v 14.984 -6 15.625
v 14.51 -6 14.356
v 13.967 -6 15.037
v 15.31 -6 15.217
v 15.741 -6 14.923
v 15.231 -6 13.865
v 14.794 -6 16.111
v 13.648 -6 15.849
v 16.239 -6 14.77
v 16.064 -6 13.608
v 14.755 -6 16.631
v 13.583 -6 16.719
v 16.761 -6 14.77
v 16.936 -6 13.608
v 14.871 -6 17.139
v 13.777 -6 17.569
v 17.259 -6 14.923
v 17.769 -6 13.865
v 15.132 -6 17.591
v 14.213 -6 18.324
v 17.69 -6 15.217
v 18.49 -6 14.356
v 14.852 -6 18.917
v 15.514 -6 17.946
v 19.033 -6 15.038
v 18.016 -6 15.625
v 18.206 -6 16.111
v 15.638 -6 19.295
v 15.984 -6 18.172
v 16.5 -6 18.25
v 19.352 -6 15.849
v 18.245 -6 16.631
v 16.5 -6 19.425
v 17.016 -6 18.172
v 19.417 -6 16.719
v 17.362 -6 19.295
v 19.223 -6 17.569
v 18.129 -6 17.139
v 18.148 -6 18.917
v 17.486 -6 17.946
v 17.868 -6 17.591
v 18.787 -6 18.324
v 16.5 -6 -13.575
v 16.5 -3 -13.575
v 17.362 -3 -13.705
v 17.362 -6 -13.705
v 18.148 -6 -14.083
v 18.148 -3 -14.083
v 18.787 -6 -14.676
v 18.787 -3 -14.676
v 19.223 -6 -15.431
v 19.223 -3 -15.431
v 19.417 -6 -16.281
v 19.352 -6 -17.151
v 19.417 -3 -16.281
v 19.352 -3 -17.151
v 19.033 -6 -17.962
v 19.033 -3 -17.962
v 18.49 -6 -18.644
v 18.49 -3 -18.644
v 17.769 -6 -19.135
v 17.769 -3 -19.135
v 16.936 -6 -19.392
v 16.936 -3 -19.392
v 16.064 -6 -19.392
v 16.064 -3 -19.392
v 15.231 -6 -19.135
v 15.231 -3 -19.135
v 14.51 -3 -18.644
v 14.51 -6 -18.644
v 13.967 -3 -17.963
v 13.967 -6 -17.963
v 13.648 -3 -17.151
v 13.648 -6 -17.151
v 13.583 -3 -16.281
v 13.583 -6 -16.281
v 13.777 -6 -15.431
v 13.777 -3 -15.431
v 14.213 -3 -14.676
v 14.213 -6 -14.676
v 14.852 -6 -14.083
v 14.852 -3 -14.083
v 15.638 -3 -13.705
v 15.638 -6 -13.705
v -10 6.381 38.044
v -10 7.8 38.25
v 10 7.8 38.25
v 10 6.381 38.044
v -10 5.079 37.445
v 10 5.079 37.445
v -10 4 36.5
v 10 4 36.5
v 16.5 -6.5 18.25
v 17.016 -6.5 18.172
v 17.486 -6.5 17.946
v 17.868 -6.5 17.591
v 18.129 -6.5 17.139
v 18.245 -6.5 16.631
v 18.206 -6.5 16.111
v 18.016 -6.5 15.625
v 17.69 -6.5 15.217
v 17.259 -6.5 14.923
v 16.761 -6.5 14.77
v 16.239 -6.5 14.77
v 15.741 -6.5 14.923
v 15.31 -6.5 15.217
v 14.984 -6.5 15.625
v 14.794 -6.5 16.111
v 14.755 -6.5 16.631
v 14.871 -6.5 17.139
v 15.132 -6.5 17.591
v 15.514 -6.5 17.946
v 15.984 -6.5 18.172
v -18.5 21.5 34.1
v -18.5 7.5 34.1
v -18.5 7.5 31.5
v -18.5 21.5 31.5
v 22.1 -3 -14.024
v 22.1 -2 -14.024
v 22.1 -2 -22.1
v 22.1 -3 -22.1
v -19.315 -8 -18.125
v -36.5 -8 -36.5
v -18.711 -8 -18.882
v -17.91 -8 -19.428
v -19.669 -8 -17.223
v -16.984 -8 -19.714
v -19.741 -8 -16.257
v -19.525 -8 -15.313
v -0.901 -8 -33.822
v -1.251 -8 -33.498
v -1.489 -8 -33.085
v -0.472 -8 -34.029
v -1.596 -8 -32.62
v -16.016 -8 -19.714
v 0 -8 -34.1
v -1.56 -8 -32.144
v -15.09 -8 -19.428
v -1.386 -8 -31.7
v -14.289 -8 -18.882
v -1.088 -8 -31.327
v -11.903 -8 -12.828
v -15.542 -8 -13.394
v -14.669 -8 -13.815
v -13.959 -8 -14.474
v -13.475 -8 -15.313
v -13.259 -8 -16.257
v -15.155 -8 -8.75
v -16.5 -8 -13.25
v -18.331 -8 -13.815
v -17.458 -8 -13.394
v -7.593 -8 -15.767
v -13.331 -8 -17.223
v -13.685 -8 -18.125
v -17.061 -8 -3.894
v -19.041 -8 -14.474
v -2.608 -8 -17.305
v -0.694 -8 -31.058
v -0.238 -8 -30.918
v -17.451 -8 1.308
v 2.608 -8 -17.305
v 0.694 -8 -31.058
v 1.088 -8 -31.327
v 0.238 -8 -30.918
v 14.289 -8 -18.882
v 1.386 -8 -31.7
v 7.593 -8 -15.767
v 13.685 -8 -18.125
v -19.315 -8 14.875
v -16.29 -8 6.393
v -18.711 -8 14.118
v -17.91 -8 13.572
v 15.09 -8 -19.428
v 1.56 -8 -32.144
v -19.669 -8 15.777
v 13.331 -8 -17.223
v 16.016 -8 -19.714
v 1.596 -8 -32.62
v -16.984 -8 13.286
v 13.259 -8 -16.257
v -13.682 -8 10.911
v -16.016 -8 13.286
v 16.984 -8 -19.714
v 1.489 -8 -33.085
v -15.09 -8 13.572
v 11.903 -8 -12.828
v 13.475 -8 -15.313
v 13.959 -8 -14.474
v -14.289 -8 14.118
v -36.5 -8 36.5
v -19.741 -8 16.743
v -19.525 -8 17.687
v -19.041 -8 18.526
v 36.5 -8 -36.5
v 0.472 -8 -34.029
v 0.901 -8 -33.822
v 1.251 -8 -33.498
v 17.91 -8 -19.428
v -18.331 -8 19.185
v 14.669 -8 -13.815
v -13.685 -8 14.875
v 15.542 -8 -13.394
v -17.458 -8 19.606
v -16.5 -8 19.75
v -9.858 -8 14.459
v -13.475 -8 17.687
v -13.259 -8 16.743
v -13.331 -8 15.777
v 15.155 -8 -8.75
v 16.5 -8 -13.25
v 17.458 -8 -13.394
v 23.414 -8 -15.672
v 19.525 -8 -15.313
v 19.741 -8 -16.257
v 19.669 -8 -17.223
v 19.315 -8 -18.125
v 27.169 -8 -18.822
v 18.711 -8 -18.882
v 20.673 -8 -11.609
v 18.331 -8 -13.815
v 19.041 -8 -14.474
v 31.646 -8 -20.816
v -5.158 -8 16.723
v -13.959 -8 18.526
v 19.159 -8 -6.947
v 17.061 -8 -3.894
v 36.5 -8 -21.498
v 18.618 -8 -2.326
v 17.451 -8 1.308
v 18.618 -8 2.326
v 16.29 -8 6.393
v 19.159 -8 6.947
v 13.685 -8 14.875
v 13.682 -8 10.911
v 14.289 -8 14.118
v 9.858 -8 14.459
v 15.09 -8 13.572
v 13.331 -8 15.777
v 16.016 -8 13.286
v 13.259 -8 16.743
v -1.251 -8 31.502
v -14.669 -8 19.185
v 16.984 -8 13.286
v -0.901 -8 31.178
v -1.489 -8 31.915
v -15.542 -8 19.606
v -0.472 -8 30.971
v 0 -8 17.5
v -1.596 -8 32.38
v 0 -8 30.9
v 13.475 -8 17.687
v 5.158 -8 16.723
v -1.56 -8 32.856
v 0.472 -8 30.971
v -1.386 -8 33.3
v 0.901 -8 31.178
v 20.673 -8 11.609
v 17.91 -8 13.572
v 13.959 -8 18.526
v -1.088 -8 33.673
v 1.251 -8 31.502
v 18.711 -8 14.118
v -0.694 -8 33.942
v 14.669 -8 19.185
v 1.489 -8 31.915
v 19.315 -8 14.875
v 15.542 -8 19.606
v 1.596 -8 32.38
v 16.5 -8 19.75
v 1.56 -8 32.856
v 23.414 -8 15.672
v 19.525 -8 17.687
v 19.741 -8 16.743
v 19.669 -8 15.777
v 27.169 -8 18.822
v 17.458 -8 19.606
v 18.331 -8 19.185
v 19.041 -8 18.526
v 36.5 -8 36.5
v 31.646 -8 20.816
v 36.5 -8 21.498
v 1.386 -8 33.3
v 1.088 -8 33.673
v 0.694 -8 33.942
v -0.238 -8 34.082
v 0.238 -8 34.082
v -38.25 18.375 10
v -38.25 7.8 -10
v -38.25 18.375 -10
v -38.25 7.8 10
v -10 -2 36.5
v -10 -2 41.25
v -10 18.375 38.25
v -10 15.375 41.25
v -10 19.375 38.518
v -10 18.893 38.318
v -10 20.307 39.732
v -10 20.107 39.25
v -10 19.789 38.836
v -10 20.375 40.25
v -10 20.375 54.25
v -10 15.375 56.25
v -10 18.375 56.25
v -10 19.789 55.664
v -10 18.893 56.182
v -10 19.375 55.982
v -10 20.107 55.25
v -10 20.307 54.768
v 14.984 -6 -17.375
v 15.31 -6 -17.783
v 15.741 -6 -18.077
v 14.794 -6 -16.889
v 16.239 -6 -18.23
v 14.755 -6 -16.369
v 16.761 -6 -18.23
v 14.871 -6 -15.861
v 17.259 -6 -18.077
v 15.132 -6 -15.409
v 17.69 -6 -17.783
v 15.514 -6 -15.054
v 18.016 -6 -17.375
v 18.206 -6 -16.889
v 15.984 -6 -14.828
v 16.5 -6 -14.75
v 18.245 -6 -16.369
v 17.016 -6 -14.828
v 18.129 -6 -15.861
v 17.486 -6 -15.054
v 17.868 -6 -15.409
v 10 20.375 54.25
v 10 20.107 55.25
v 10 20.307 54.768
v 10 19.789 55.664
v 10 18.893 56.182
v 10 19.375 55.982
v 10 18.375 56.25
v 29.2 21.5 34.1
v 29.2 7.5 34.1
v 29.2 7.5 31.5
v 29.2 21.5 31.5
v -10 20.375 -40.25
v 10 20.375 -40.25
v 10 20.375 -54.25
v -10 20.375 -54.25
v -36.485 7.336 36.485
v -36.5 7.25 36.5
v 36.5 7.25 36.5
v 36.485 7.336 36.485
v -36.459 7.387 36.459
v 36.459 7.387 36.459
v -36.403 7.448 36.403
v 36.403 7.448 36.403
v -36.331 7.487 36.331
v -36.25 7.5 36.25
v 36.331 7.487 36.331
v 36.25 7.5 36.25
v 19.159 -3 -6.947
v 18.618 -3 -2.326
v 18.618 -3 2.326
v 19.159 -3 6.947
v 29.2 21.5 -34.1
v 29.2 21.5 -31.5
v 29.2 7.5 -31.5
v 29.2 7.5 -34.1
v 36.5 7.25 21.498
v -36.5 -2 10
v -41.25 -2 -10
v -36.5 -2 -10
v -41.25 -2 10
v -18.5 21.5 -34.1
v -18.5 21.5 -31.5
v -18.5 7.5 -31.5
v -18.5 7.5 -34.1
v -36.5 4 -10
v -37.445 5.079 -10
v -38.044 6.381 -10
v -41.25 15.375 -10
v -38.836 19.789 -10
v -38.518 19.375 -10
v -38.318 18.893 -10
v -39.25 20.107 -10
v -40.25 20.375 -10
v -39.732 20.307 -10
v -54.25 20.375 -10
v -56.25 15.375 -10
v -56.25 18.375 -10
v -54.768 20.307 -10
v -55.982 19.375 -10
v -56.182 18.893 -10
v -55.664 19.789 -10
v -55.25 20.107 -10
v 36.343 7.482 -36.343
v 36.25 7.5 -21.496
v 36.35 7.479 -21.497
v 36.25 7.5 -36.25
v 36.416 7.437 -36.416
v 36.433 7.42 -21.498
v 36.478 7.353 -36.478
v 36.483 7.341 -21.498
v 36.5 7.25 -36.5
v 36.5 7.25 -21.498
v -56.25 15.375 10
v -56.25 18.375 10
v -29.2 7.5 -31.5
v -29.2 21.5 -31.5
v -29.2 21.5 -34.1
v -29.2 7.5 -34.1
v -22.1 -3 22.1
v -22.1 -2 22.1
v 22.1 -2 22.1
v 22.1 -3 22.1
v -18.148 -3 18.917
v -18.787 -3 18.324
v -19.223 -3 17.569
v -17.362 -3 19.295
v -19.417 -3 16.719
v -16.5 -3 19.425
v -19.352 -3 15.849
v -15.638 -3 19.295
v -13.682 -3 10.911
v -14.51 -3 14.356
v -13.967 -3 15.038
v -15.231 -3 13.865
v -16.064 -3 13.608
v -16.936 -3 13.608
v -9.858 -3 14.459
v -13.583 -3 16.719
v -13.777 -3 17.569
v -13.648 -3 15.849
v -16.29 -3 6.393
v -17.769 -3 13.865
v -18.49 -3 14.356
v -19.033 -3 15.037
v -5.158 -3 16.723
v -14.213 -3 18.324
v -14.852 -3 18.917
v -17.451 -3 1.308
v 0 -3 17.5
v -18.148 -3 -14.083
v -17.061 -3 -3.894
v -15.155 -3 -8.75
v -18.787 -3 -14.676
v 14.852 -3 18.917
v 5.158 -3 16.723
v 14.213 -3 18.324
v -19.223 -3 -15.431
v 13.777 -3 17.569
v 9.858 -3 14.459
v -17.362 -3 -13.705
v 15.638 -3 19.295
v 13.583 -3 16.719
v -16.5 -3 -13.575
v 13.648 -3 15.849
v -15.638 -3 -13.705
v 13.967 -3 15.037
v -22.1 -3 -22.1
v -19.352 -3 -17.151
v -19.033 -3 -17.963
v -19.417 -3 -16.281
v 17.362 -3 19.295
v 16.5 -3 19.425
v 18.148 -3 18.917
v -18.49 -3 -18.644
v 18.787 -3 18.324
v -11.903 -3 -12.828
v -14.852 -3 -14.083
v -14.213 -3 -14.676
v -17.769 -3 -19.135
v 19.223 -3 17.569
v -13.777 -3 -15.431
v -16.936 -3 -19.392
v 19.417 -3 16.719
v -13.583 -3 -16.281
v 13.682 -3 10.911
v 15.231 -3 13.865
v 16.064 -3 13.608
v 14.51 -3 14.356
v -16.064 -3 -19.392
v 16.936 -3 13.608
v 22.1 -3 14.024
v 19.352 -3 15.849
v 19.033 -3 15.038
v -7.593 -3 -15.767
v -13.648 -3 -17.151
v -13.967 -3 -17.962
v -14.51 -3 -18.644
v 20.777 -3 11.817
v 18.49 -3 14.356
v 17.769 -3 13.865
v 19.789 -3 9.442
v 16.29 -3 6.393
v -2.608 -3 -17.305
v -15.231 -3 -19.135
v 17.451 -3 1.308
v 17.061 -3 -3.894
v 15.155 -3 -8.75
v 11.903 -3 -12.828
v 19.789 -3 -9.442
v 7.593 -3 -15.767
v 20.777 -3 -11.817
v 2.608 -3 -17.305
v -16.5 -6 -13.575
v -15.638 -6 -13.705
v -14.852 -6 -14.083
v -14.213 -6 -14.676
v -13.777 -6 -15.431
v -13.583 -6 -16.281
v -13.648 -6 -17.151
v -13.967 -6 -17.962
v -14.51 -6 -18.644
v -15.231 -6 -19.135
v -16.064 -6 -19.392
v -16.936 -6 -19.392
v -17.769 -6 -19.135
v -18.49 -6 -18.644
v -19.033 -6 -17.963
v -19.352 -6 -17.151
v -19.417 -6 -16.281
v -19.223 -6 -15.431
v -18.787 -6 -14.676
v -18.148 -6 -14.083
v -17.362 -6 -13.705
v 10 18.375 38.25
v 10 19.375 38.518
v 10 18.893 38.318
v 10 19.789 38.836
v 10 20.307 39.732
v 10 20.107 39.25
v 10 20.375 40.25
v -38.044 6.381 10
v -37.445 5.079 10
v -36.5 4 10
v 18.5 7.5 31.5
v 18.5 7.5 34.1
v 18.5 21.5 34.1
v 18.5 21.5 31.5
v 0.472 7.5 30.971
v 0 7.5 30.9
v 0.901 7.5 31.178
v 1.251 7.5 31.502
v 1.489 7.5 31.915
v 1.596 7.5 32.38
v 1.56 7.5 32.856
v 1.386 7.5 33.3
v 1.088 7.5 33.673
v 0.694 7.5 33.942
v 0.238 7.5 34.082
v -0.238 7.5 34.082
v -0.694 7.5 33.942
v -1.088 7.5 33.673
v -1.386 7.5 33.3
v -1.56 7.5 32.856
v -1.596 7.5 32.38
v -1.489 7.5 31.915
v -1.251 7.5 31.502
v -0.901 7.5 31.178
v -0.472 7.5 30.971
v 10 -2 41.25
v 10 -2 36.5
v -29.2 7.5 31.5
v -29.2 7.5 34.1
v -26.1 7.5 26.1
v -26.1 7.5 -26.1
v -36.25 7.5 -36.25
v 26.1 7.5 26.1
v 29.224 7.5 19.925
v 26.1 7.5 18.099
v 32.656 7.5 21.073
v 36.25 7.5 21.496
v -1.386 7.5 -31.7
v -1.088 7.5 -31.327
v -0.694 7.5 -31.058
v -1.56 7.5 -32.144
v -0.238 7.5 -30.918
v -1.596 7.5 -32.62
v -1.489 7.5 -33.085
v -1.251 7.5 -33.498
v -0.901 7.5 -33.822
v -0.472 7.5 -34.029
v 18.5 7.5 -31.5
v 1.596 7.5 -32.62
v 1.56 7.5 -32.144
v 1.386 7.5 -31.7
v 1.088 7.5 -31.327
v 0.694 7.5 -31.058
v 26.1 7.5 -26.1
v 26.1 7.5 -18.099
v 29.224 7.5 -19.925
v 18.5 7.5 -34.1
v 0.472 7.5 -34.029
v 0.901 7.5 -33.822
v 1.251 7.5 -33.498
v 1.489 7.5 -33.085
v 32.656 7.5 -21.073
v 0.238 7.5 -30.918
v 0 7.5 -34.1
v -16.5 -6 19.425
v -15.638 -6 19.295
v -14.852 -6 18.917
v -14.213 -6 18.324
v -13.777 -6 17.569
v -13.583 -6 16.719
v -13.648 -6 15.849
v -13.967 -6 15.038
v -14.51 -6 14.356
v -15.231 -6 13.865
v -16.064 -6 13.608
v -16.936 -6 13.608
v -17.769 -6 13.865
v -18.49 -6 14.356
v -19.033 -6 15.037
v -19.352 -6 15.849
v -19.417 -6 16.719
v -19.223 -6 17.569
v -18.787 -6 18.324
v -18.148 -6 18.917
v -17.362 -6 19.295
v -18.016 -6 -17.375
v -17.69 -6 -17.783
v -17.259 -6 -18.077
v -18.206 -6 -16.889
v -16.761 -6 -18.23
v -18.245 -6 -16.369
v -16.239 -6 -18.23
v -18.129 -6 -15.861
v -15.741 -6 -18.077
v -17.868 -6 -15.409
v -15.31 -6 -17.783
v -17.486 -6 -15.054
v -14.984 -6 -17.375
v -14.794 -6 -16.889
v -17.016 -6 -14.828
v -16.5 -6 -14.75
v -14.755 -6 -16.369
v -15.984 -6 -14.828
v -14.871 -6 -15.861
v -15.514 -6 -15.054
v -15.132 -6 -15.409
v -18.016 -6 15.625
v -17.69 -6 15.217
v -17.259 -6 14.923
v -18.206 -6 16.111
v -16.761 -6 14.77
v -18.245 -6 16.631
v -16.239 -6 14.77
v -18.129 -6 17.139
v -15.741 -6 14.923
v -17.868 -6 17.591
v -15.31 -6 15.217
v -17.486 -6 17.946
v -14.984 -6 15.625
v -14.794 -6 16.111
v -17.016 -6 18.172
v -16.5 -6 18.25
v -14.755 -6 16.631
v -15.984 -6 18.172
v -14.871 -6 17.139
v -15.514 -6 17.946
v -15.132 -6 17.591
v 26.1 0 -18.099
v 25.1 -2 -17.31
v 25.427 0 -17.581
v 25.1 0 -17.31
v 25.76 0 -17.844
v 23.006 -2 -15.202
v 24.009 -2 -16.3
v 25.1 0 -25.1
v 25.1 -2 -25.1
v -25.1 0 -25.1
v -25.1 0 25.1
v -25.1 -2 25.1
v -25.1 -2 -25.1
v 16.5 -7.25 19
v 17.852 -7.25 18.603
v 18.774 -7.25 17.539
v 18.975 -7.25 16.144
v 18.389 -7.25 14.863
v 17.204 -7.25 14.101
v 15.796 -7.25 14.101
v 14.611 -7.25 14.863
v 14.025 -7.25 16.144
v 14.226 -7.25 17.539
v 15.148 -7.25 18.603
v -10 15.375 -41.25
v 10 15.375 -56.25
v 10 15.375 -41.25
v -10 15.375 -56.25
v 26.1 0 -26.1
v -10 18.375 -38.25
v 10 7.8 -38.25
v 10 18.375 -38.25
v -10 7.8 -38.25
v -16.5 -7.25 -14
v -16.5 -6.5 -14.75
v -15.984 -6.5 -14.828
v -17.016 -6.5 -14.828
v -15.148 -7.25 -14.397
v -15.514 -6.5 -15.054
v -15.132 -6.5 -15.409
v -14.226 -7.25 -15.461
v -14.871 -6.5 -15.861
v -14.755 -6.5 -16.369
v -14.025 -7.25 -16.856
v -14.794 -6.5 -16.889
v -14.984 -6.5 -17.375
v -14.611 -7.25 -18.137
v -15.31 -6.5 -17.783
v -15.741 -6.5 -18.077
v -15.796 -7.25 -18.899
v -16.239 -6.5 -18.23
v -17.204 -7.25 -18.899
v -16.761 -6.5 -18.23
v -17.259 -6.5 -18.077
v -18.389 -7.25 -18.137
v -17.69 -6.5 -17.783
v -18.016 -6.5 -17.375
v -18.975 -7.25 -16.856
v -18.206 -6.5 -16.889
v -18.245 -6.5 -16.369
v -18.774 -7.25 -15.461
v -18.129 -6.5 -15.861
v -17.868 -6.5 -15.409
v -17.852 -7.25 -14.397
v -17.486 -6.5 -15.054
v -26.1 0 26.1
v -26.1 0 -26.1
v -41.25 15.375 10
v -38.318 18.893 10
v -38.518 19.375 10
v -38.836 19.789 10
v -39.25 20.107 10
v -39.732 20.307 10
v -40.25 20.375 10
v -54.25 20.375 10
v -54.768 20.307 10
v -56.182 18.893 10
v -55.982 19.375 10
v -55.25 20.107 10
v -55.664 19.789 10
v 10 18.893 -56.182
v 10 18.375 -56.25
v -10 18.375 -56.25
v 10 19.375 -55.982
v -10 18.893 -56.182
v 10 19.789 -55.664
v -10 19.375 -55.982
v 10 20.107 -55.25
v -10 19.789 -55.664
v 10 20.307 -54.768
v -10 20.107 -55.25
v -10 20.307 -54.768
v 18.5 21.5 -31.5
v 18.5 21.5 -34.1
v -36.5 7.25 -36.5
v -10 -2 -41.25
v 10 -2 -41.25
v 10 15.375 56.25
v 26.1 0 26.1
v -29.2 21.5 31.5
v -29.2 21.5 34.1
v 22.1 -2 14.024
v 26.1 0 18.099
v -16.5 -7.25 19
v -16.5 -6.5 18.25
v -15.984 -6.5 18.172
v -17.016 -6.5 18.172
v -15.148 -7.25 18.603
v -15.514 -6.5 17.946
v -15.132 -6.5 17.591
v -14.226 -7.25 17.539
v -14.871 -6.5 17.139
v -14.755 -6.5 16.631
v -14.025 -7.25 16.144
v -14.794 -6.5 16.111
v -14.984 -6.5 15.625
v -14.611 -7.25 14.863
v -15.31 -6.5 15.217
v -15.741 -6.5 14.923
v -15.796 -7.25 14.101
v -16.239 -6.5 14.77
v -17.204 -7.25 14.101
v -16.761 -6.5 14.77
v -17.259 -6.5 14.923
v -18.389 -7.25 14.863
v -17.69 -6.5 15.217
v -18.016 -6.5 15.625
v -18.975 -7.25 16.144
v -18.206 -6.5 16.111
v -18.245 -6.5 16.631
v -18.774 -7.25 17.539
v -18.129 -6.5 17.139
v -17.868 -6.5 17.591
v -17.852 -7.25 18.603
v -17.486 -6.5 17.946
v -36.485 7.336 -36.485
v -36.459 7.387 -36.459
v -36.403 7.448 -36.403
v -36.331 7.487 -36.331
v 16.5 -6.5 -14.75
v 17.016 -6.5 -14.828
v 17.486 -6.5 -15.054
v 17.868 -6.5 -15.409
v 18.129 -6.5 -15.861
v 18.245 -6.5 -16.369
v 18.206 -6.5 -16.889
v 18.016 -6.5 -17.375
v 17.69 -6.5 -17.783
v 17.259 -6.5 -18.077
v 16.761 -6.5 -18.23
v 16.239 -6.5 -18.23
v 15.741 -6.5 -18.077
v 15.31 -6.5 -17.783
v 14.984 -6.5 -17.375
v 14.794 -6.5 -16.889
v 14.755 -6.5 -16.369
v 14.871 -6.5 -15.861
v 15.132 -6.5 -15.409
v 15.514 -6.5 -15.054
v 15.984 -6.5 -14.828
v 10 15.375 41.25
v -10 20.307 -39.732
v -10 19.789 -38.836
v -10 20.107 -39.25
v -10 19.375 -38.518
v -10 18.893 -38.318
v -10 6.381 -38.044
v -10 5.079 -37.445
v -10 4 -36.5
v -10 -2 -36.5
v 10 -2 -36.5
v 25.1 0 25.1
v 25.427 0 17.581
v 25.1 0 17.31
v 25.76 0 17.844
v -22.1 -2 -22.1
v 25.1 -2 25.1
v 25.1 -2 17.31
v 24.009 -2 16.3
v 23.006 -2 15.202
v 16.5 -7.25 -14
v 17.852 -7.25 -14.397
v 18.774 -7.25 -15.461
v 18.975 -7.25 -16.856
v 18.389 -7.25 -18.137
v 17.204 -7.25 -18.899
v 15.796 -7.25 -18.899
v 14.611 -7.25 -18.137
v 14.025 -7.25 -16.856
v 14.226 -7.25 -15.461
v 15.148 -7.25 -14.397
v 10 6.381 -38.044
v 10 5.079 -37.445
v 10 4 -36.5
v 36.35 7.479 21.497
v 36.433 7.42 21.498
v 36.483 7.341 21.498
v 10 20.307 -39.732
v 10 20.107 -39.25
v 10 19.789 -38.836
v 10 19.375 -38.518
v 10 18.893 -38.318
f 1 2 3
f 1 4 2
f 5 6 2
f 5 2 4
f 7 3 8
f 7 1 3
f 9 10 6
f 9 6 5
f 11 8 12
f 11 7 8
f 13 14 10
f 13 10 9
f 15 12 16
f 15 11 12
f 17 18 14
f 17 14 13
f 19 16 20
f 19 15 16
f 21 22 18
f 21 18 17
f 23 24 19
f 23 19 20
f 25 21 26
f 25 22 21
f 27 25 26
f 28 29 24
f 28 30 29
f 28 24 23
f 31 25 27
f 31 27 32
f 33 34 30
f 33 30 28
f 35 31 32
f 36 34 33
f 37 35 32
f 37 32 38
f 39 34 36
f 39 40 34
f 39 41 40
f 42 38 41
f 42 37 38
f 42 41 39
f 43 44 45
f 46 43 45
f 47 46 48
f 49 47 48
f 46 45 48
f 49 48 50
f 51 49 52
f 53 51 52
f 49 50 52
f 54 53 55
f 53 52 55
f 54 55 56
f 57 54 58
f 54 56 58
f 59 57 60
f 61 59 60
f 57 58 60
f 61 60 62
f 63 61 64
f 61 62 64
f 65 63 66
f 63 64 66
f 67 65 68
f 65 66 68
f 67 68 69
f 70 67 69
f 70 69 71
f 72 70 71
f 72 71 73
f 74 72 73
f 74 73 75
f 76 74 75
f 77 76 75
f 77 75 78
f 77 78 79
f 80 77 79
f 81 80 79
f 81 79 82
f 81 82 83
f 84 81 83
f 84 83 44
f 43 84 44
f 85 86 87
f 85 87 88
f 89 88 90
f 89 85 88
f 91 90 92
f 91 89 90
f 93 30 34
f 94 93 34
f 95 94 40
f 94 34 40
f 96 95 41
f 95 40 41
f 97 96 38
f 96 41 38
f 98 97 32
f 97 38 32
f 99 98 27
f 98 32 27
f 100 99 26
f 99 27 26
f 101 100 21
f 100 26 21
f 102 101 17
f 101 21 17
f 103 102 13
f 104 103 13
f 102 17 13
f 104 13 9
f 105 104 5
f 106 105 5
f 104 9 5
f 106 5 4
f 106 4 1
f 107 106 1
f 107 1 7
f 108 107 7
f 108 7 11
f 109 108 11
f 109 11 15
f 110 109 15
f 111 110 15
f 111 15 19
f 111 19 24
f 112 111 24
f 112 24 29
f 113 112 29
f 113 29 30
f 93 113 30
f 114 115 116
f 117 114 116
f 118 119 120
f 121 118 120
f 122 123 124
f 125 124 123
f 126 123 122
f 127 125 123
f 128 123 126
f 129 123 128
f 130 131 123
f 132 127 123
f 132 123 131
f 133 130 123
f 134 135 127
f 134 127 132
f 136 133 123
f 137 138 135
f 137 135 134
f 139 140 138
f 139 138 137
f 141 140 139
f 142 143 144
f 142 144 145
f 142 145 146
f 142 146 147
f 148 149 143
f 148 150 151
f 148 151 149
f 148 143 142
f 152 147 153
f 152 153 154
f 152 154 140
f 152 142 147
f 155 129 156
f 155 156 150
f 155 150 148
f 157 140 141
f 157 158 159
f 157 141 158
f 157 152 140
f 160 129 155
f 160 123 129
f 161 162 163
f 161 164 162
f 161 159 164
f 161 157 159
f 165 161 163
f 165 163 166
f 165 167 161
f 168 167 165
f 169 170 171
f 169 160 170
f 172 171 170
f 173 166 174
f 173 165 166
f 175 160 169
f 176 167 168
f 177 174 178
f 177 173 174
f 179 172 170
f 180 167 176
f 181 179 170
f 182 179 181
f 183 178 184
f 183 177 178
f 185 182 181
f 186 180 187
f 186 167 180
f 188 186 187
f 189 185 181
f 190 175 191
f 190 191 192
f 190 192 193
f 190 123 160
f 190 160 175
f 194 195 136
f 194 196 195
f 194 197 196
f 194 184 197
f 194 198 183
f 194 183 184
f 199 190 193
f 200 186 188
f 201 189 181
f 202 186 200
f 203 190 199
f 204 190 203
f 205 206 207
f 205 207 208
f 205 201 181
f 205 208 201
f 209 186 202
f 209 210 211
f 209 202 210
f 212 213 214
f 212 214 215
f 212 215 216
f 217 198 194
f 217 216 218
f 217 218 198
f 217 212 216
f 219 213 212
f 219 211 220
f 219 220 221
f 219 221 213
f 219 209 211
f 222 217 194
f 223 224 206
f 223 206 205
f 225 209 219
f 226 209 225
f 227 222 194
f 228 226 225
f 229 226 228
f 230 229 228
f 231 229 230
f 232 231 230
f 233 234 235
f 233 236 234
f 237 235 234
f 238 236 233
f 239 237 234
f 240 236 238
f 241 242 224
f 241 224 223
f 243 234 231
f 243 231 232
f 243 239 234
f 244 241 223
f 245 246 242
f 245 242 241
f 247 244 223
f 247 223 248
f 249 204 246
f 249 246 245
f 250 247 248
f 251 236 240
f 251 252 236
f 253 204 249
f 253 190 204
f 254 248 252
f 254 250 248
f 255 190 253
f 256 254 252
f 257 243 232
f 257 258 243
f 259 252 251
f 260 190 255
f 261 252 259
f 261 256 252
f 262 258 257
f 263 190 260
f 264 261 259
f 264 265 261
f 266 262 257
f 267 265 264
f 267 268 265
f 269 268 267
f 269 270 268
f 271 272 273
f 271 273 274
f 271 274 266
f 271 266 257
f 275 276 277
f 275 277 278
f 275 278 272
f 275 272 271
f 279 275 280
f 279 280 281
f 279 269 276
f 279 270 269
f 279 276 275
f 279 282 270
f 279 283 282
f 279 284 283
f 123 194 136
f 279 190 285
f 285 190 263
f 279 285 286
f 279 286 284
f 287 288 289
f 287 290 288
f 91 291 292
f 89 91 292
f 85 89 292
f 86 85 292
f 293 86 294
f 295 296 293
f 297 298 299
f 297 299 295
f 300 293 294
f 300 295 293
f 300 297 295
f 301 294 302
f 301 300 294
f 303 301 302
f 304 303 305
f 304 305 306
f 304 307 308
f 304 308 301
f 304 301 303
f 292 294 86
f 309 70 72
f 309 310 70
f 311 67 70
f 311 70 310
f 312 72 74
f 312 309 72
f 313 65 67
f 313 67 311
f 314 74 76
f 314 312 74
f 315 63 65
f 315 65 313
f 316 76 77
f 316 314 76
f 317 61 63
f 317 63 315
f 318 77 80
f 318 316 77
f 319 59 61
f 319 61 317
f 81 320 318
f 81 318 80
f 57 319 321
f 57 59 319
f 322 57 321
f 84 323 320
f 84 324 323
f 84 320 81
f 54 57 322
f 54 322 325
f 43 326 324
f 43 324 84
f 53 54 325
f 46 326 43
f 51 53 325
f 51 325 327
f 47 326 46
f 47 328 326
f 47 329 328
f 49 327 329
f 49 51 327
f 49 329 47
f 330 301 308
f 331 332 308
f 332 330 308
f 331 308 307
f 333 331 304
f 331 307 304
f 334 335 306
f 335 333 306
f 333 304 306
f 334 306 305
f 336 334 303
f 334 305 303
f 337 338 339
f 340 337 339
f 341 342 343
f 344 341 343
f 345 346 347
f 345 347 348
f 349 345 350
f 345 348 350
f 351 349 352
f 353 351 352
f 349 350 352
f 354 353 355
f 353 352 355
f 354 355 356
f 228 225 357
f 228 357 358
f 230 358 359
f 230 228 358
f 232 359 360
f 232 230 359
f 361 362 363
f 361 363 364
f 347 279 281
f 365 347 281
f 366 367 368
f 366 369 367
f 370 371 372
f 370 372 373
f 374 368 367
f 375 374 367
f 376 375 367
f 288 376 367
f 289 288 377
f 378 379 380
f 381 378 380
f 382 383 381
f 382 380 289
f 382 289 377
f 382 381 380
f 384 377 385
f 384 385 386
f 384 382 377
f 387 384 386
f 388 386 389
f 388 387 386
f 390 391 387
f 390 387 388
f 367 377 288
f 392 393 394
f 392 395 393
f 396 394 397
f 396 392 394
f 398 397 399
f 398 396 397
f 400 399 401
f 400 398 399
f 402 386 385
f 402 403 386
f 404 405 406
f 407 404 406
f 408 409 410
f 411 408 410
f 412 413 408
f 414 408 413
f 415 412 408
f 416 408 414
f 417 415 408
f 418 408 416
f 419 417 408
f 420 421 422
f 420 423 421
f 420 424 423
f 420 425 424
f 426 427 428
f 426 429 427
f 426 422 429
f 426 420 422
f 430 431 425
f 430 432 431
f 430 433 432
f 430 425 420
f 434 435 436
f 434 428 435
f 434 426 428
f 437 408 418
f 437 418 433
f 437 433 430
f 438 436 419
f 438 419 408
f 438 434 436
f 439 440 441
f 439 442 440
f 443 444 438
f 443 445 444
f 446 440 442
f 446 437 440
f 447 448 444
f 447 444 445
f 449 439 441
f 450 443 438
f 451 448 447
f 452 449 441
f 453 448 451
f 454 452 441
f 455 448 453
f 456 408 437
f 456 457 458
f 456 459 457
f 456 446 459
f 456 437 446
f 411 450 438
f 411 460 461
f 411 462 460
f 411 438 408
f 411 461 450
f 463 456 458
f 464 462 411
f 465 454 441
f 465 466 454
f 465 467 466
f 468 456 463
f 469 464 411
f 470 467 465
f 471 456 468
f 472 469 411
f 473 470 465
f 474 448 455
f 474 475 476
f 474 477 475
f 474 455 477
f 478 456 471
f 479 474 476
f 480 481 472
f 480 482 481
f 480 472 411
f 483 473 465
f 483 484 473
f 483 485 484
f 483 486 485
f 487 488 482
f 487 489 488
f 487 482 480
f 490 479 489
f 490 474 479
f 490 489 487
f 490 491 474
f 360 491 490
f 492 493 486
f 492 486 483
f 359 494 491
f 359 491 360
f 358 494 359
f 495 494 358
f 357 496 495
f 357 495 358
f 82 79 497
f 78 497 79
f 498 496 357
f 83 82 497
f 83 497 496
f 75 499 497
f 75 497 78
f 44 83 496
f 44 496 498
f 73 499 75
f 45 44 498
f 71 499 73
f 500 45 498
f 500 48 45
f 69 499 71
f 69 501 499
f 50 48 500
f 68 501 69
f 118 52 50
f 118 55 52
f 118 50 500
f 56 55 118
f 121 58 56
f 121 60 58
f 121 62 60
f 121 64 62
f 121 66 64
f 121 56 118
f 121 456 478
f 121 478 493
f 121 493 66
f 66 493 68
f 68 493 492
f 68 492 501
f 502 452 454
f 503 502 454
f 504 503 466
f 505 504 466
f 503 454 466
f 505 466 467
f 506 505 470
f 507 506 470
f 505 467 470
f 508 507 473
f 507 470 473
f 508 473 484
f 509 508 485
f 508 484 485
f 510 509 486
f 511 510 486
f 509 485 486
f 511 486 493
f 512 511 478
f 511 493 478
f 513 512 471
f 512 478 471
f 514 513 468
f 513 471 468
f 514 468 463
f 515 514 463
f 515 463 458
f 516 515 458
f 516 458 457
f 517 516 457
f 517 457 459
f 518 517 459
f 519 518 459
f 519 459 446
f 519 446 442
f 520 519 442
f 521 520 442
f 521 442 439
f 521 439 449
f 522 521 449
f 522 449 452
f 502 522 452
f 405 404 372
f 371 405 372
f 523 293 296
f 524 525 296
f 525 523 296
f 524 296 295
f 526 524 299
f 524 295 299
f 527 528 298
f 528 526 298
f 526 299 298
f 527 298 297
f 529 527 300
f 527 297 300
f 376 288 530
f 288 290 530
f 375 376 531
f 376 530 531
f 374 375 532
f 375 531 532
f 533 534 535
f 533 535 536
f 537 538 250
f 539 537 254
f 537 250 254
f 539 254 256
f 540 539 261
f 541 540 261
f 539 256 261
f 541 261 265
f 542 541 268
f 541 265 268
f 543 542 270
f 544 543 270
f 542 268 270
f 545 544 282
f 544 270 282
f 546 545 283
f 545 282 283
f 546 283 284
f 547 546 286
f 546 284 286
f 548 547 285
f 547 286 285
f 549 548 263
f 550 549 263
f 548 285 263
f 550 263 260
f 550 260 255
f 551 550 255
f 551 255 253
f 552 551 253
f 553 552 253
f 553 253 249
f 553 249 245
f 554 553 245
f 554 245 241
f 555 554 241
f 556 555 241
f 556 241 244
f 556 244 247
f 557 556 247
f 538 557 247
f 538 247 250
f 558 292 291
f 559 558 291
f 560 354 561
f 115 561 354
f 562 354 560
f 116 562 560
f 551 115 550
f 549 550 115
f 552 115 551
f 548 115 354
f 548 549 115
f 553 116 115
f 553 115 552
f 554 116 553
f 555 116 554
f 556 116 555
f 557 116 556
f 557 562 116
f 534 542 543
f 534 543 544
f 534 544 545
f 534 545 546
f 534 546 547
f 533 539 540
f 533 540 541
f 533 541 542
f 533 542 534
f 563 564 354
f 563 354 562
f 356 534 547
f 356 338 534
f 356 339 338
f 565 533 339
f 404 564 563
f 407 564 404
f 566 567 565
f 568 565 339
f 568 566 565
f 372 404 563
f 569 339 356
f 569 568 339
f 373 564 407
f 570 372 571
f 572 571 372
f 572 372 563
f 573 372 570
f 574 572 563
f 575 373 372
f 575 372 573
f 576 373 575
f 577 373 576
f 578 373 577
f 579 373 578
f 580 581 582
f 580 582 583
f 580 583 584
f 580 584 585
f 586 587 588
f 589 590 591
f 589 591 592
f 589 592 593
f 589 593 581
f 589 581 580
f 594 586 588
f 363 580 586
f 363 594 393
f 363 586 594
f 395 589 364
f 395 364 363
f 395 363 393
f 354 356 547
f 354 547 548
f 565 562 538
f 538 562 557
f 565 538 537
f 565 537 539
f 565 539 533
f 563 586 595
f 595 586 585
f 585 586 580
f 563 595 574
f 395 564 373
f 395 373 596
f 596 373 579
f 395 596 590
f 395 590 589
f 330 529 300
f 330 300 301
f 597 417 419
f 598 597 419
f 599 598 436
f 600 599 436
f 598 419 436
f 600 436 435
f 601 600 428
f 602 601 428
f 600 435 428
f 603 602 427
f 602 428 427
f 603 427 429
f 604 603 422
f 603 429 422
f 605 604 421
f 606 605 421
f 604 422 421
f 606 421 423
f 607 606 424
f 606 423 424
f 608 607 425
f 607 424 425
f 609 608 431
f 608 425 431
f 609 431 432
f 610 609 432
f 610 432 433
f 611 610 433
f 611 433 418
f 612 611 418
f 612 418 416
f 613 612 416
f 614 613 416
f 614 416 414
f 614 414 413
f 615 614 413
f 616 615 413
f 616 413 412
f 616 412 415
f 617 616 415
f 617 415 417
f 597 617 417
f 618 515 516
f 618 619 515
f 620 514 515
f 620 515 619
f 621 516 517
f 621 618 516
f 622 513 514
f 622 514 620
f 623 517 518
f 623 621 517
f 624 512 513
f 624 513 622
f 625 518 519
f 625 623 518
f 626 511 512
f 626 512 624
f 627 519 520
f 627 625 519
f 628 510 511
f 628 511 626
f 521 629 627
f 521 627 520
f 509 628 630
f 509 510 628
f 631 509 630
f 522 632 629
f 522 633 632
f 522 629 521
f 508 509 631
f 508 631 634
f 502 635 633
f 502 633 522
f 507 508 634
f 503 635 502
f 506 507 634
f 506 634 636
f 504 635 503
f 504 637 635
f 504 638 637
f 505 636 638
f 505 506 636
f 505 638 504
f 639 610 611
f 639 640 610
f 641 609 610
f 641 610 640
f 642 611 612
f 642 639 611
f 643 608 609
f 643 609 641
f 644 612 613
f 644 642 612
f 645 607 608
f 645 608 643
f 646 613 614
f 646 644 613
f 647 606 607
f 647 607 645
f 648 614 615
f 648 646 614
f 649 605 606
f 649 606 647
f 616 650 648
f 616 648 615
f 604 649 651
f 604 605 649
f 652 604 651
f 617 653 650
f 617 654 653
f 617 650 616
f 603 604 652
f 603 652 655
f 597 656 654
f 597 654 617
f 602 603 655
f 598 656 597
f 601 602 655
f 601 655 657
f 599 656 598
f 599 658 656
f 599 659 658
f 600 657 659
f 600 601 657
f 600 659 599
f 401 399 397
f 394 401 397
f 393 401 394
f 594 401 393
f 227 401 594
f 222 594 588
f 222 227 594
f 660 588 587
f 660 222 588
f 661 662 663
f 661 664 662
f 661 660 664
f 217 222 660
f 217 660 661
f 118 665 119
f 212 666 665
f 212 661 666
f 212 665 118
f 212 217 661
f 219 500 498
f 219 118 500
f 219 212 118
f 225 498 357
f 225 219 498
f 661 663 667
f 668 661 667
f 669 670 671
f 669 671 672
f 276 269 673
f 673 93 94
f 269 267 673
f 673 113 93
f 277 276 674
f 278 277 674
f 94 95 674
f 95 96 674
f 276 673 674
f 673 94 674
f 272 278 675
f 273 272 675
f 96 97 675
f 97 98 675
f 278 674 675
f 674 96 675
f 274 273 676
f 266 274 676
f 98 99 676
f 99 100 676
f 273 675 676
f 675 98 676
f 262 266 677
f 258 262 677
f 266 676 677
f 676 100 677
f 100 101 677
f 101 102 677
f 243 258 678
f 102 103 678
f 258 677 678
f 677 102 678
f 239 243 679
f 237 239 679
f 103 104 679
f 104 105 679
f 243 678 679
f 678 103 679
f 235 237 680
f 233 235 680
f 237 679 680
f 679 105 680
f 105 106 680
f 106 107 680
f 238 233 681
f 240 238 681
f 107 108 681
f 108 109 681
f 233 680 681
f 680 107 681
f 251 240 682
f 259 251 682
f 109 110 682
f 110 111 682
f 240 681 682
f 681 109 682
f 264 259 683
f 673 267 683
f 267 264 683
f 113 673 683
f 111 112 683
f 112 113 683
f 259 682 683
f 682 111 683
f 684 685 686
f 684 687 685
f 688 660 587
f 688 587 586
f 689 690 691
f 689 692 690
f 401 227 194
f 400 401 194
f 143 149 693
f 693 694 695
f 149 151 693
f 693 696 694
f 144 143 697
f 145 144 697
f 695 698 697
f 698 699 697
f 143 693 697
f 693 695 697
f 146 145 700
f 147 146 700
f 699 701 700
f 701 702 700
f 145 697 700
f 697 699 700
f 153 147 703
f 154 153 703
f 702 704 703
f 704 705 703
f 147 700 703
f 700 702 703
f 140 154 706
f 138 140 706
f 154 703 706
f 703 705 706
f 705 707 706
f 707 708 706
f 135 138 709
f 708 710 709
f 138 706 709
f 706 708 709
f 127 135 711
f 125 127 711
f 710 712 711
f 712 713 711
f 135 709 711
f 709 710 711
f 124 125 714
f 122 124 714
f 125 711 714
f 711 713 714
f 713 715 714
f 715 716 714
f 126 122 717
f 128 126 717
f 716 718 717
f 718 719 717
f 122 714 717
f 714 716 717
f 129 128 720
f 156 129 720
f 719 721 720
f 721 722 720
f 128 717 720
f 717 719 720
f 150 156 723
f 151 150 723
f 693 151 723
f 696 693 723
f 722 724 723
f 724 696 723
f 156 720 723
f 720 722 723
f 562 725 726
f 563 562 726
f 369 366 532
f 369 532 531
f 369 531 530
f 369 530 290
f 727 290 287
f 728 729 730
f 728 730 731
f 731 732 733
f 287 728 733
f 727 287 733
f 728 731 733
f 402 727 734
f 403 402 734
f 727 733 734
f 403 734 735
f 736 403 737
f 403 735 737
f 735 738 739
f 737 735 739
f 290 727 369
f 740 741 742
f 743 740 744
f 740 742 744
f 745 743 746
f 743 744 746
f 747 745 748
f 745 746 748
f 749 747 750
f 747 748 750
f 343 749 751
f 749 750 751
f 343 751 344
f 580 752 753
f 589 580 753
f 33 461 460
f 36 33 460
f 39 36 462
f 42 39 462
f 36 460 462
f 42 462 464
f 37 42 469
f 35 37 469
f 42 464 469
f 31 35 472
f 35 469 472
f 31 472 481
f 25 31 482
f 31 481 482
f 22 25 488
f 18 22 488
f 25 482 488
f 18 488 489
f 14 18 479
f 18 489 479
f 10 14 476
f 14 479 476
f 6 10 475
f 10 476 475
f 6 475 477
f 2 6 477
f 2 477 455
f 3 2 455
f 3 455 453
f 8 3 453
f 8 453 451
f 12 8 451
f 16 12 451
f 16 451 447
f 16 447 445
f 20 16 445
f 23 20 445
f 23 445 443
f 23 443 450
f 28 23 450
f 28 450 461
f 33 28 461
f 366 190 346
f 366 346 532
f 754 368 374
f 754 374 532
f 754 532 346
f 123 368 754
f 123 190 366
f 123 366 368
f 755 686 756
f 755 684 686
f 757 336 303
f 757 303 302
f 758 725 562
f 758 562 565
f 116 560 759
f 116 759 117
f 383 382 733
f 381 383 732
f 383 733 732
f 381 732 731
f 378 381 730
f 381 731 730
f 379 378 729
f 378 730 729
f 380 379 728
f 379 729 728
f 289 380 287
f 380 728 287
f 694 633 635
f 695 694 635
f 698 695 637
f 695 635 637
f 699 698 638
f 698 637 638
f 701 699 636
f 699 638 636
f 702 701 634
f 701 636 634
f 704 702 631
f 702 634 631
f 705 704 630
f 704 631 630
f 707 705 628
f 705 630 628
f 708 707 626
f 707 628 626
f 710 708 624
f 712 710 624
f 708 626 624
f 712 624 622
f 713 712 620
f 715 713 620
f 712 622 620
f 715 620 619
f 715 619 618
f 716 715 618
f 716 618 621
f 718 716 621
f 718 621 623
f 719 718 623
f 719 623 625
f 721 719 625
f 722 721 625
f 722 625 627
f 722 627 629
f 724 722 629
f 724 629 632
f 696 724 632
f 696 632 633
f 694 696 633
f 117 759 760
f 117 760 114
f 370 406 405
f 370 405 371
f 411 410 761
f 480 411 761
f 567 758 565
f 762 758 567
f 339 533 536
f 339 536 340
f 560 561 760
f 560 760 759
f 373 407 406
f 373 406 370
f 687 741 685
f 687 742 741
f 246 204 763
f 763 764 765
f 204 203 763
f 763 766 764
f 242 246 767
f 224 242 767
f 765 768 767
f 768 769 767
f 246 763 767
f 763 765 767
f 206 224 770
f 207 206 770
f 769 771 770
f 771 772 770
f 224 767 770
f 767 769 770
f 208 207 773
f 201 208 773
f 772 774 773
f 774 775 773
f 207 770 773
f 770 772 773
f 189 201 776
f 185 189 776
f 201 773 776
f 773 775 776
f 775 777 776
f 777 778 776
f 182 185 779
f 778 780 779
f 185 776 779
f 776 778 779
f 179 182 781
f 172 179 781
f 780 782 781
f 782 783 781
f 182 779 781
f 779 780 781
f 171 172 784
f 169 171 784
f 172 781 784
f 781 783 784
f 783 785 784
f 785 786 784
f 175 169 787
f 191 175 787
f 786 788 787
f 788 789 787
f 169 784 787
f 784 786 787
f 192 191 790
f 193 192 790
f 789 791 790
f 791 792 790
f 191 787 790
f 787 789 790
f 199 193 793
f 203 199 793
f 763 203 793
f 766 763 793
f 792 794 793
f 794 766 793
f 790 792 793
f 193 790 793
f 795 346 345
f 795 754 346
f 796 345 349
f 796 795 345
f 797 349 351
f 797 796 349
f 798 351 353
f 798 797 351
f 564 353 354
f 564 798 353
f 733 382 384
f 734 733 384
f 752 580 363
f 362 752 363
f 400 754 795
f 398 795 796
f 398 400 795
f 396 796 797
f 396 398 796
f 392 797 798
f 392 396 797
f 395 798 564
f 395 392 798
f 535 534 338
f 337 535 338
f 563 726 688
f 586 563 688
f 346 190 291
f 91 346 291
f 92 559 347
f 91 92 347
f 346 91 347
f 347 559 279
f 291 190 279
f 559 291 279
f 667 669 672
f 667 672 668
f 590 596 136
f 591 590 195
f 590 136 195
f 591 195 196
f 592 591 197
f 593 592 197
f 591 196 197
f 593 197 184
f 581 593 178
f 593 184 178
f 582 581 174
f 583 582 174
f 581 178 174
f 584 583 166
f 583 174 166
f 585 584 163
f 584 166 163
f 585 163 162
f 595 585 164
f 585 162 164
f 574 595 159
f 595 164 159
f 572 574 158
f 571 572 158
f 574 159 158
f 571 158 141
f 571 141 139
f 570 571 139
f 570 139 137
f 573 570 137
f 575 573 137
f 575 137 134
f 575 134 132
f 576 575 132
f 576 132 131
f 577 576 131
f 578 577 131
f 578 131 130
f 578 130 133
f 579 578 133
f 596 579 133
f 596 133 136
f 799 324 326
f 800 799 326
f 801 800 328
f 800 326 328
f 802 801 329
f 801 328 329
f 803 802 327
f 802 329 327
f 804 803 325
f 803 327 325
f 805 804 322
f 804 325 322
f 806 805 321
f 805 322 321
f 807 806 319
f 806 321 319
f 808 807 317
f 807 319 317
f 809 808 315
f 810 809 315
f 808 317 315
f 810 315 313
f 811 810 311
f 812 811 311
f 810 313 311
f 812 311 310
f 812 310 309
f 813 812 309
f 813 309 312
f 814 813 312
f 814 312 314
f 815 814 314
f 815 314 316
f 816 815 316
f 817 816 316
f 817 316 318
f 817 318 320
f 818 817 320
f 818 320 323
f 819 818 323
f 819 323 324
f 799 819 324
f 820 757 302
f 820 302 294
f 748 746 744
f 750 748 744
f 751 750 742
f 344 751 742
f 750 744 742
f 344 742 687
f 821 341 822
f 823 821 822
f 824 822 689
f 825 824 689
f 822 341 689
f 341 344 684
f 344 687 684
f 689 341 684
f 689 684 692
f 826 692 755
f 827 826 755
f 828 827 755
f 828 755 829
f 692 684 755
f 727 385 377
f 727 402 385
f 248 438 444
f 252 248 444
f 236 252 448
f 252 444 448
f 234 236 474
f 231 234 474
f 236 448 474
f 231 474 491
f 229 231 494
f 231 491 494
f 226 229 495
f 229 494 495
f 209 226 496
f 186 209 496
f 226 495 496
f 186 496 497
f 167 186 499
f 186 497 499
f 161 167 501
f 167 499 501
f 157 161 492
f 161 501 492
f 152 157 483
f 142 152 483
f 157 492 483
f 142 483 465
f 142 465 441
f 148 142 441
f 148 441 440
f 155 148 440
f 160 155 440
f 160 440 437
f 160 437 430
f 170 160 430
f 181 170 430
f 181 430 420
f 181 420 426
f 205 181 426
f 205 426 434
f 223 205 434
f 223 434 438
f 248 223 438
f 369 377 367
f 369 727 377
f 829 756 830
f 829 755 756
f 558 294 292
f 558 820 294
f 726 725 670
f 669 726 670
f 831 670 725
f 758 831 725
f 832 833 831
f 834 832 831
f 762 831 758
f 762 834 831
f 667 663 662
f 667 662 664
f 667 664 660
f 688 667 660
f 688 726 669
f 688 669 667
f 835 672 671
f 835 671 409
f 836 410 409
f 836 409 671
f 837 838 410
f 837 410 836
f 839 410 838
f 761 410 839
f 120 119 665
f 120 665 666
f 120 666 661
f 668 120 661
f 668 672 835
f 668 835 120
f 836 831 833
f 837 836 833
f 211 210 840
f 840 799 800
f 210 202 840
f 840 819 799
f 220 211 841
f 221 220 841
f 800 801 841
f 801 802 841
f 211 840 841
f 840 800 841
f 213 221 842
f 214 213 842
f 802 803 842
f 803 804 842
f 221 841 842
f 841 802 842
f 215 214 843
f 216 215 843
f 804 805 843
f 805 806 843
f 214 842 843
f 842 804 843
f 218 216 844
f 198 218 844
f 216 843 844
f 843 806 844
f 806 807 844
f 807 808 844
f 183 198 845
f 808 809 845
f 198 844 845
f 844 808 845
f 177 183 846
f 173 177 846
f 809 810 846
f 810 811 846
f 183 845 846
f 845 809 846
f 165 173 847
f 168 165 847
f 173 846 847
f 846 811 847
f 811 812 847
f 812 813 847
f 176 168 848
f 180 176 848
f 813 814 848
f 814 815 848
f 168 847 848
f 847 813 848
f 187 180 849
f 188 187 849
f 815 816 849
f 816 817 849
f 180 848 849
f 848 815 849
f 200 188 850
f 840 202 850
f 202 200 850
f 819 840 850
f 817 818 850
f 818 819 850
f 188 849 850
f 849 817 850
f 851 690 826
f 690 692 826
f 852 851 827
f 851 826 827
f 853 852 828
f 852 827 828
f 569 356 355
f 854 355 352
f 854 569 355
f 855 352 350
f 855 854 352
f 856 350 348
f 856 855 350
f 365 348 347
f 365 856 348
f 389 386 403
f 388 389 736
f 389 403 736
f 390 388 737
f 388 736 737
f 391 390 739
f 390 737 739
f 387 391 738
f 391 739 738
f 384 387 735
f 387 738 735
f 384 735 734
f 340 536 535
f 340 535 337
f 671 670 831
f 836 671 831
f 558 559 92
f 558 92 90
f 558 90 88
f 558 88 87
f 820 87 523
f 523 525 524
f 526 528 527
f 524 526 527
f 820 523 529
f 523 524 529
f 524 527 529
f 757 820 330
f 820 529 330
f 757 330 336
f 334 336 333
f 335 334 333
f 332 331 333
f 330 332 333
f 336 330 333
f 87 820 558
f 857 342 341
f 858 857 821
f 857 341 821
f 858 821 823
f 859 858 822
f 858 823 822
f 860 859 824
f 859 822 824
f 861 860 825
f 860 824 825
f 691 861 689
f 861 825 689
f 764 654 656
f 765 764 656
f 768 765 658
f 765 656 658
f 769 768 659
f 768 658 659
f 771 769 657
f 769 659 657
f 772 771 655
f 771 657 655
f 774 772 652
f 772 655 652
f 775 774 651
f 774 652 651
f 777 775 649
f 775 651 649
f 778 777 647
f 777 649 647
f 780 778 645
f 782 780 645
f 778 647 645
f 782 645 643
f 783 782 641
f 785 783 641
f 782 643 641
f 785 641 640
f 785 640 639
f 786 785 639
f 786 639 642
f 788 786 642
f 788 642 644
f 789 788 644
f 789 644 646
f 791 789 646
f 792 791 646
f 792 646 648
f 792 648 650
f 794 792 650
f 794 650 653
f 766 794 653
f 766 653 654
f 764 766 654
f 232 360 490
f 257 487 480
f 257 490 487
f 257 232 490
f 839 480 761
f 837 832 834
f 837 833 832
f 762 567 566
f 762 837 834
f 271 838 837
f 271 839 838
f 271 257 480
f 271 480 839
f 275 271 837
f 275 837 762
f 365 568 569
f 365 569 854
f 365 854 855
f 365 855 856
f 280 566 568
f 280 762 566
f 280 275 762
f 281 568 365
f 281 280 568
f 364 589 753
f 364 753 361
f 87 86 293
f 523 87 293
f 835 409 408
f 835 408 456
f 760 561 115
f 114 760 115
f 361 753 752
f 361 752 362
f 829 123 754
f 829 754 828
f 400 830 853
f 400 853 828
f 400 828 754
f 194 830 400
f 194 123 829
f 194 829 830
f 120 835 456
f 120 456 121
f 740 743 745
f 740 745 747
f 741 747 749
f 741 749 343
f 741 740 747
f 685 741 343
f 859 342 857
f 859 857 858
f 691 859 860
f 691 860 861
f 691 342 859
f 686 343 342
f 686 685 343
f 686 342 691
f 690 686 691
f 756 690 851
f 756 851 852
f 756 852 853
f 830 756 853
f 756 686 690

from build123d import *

# Parameters (mm, degrees)
SKETCH3_W           = 73
SKETCH3_H           = 73
BOSS_EXTRUDE3_DEPTH = 10
SKETCH3_3_W         = 50.2
SKETCH3_3_H         = 50.2
CUT_EXTRUDE2_DEPTH  = 2
SKETCH4_R           = 2.925
CUT_EXTRUDE3_DEPTH  = 4
SKETCH13_R          = 1.75
CUT_EXTRUDE6_DEPTH  = 10
SKETCH5_W           = 44.2
SKETCH5_H           = 44.2
CUT_EXTRUDE4_DEPTH  = 1
SKETCH7_W           = 73
SKETCH7_H           = 73
SKETCH7_W_2         = 52.2
SKETCH7_H_2         = 52.2
BOSS_EXTRUDE5_DEPTH = 9.5
SKETCH8_W           = 10.7
SKETCH8_H           = 2.6
BOSS_EXTRUDE6_DEPTH = 14
FILLET1_R           = 0.25
SKETCH9_R           = 17.5
CUT_EXTRUDE5_DEPTH  = 10
BOSS_EXTRUDE7_DEPTH = 10
FILLET2_R           = 5
FILLET2_R_2         = 2
SKETCH15_W          = 73
SKETCH15_H          = 73
REBAIX_DEPTH        = 2
CUT_EXTRUDE11_START = -15.5
CUT_EXTRUDE11_DEPTH = 15.5
SKETCH19_R          = 1.6
CUT_EXTRUDE12_DEPTH = 85.84323793
CHAMFER1_SIZE       = 1.5


with BuildPart() as part:
    # Sketch3 → Boss-Extrude3 (new body)
    with BuildSketch(Plane(origin=(0, 0, 0), x_dir=(1, 0, 0), z_dir=(0, 1, 0))):
        Rectangle(SKETCH3_W, SKETCH3_H)
    extrude(amount=-BOSS_EXTRUDE3_DEPTH)

    # Sketch3<3> → Cut-Extrude2 (cut)
    with BuildSketch(Plane(origin=(0, 0, 0), x_dir=(1, 0, 0), z_dir=(0, 1, 0))):
        Rectangle(SKETCH3_3_W, SKETCH3_3_H)
    extrude(amount=-CUT_EXTRUDE2_DEPTH, mode=Mode.SUBTRACT)

    # Sketch4 → Cut-Extrude3 (cut)
    with BuildSketch(Plane(origin=(0, -2, 0), x_dir=(1, 0, 0), z_dir=(0, 1, 0))):
        with Locations(Location((-16.5, 16.5, 0), (0, 0, 270))):
            Circle(SKETCH4_R)
        with Locations(Location((16.5, 16.5, 0), (0, 0, 270))):
            Circle(SKETCH4_R)
        with Locations(Location((-16.5, -16.5, 0), (0, 0, 270))):
            Circle(SKETCH4_R)
        with Locations(Location((16.5, -16.5, 0), (0, 0, 270))):
            Circle(SKETCH4_R)
    extrude(amount=-CUT_EXTRUDE3_DEPTH, mode=Mode.SUBTRACT)

    # Sketch13 → Cut-Extrude6 (cut)
    with BuildSketch(Plane(origin=(0, -6, 0), x_dir=(1, 0, 0), z_dir=(0, 1, 0))):
        with Locations(Location((16.5, 16.5, 0), (0, 0, 270))):
            Circle(SKETCH13_R)
        with Locations(Location((16.5, -16.5, 0), (0, 0, 270))):
            Circle(SKETCH13_R)
        with Locations(Location((-16.5, -16.5, 0), (0, 0, 270))):
            Circle(SKETCH13_R)
        with Locations(Location((-16.5, 16.5, 0), (0, 0, 270))):
            Circle(SKETCH13_R)
    extrude(amount=-CUT_EXTRUDE6_DEPTH, mode=Mode.SUBTRACT)

    # Sketch5 → Cut-Extrude4 (cut)
    with BuildSketch(Plane(origin=(0, -2, 0), x_dir=(1, 0, 0), z_dir=(0, 1, 0))):
        Rectangle(SKETCH5_W, SKETCH5_H)
    extrude(amount=-CUT_EXTRUDE4_DEPTH, mode=Mode.SUBTRACT)

    # Sketch7 → Boss-Extrude5 (add)
    with BuildSketch(Plane(origin=(0, -2, 0), x_dir=(1, 0, 0), z_dir=(0, 1, 0))):
        Rectangle(SKETCH7_W, SKETCH7_H)
        Rectangle(SKETCH7_W_2, SKETCH7_H_2, mode=Mode.SUBTRACT)
    extrude(amount=BOSS_EXTRUDE5_DEPTH)

    # Sketch8 → Boss-Extrude6 (add)
    with BuildSketch(Plane(origin=(0, 7.5, 0), x_dir=(1, 0, 0), z_dir=(0, 1, 0))):
        with Locations((-23.85, 32.8)):
            Rectangle(SKETCH8_W, SKETCH8_H)
        with Locations((-23.85, -32.8)):
            Rectangle(SKETCH8_W, SKETCH8_H)
        with Locations((23.85, 32.8)):
            Rectangle(SKETCH8_W, SKETCH8_H)
        with Locations((23.85, -32.8)):
            Rectangle(SKETCH8_W, SKETCH8_H)
    extrude(amount=BOSS_EXTRUDE6_DEPTH)

    # Fillet1
    fillet1_edges = [part.edges().sort_by_distance(p)[0] for p in [
        (-36.5, 7.5, 0),
        (0, 7.5, 36.5),
        (36.5, 7.5, 0),
        (0, 7.5, -36.5),
    ]]
    fillet(fillet1_edges, radius=FILLET1_R)

    # Sketch9 → Cut-Extrude5 (cut)
    with BuildSketch(Plane(origin=(0, -3, 0), x_dir=(1, 0, 0), z_dir=(0, 1, 0))):
        with Locations(Location((0, 0, 0), (0, 0, 270))):
            Circle(SKETCH9_R)
    extrude(amount=-CUT_EXTRUDE5_DEPTH, mode=Mode.SUBTRACT)

    # Sketch10 → Boss-Extrude7 (add, symmetric)
    with BuildSketch(Plane(origin=(0, 0, 0), x_dir=(0, 0, -1), z_dir=(1, 0, 0))):
        Polygon((-36.5, -2), (-36.5, 4), (-38.25, 4), (-38.25, 20.375), (-56.25, 20.375), (-56.25, 15.375), (-41.25, 15.375), (-41.25, -2), align=None)
    extrude(amount=BOSS_EXTRUDE7_DEPTH, both=True)

    # Fillet2
    # the kernel refuses this fillet: 5, 2 mm, written as the material it adds along each edge
    with BuildSketch(Plane(origin=(-10, 4, 38.25), x_dir=(0, 0, -1), z_dir=(1, 0, 0))) as fillet2_piece_1:
        with BuildLine():
            CenterArc((5, 3.799671038), FILLET2_R, 180, 49.458398126)
            Line((0, 3.799671038), (0, 0))
            Line((0, 0), (1.75, 0))
        make_face()
    extrude(amount=20)
    # the kernel refuses this fillet: 5, 2 mm, written as the material it takes off along each edge
    with BuildSketch(Plane(origin=(-15, 20.375, 56.25), x_dir=(0, 0, -1), z_dir=(1, 0, 0)), Plane(origin=(-15, 20.375, 38.25), x_dir=(0, -1, 0), z_dir=(1, 0, 0))) as fillet2_2_piece_1:
        with BuildLine():
            CenterArc((FILLET2_R_2, -FILLET2_R_2), FILLET2_R_2, 90, 90)
            Line((0, -FILLET2_R_2), (0, 0))
            Line((0, 0), (FILLET2_R_2, 0))
        make_face()
    extrude(amount=30, mode=Mode.SUBTRACT)

    # CirPattern1: read off the stored shape, not the designer's step
    # CirPattern1: loft between two sections, ruled curve by curve
    cirpattern1_from = [
        Edge.make_three_point_arc((-38.25, 7.799671038, -10), (-37.791475531, 5.708020972, -10), (-36.5, 4, -10)),
        Edge.make_three_point_arc((-40.25, 20.375, -10), (-38.835786438, 19.789213562, -10), (-38.25, 18.375, -10)),
        Edge.make_three_point_arc((-56.25, 18.375, -10), (-55.664213562, 19.789213562, -10), (-54.25, 20.375, -10)),
        Edge.make_line((-41.25, -2, -10), (-36.5, -2, -10)),
        Edge.make_line((-40.25, 20.375, -10), (-54.25, 20.375, -10)),
        Edge.make_line((-56.25, 15.375, -10), (-41.25, 15.375, -10)),
        Edge.make_line((-41.25, 15.375, -10), (-41.25, -2, -10)),
        Edge.make_line((-38.25, 7.799671038, -10), (-38.25, 18.375, -10)),
        Edge.make_line((-56.25, 18.375, -10), (-56.25, 15.375, -10)),
        Edge.make_line((-36.5, -2, -10), (-36.5, 4, -10)),
    ]
    cirpattern1_to = [
        Edge.make_three_point_arc((-38.25, 7.799671038, 10), (-37.791475531, 5.708020972, 10), (-36.5, 4, 10)),
        Edge.make_three_point_arc((-40.25, 20.375, 10), (-38.835786438, 19.789213562, 10), (-38.25, 18.375, 10)),
        Edge.make_three_point_arc((-56.25, 18.375, 10), (-55.664213562, 19.789213562, 10), (-54.25, 20.375, 10)),
        Edge.make_line((-41.25, -2, 10), (-36.5, -2, 10)),
        Edge.make_line((-40.25, 20.375, 10), (-54.25, 20.375, 10)),
        Edge.make_line((-56.25, 15.375, 10), (-41.25, 15.375, 10)),
        Edge.make_line((-41.25, 15.375, 10), (-41.25, -2, 10)),
        Edge.make_line((-38.25, 7.799671038, 10), (-38.25, 18.375, 10)),
        Edge.make_line((-56.25, 18.375, 10), (-56.25, 15.375, 10)),
        Edge.make_line((-36.5, -2, 10), (-36.5, 4, 10)),
    ]
    cirpattern1 = Solid(Shell([*[Face.make_surface_from_curves(cirpattern1_from[k], cirpattern1_to[k]) for k in range(10)], Face(Wire(cirpattern1_from)), Face(Wire(cirpattern1_to))]))
    add(cirpattern1)

    # CirPattern1 2: loft between two sections, ruled curve by curve
    cirpattern1_2_from = [
        Edge.make_three_point_arc((10, 7.799671038, -38.25), (10, 5.708020972, -37.791475531), (10, 4, -36.5)),
        Edge.make_three_point_arc((10, 20.375, -40.25), (10, 19.789213562, -38.835786438), (10, 18.375, -38.25)),
        Edge.make_three_point_arc((10, 18.375, -56.25), (10, 19.789213562, -55.664213562), (10, 20.375, -54.25)),
        Edge.make_line((10, -2, -41.25), (10, -2, -36.5)),
        Edge.make_line((10, 20.375, -40.25), (10, 20.375, -54.25)),
        Edge.make_line((10, 15.375, -56.25), (10, 15.375, -41.25)),
        Edge.make_line((10, 15.375, -41.25), (10, -2, -41.25)),
        Edge.make_line((10, 7.799671038, -38.25), (10, 18.375, -38.25)),
        Edge.make_line((10, 18.375, -56.25), (10, 15.375, -56.25)),
        Edge.make_line((10, -2, -36.5), (10, 4, -36.5)),
    ]
    cirpattern1_2_to = [
        Edge.make_three_point_arc((-10, 7.799671038, -38.25), (-10, 5.708020972, -37.791475531), (-10, 4, -36.5)),
        Edge.make_three_point_arc((-10, 20.375, -40.25), (-10, 19.789213562, -38.835786438), (-10, 18.375, -38.25)),
        Edge.make_three_point_arc((-10, 18.375, -56.25), (-10, 19.789213562, -55.664213562), (-10, 20.375, -54.25)),
        Edge.make_line((-10, -2, -41.25), (-10, -2, -36.5)),
        Edge.make_line((-10, 20.375, -40.25), (-10, 20.375, -54.25)),
        Edge.make_line((-10, 15.375, -56.25), (-10, 15.375, -41.25)),
        Edge.make_line((-10, 15.375, -41.25), (-10, -2, -41.25)),
        Edge.make_line((-10, 7.799671038, -38.25), (-10, 18.375, -38.25)),
        Edge.make_line((-10, 18.375, -56.25), (-10, 15.375, -56.25)),
        Edge.make_line((-10, -2, -36.5), (-10, 4, -36.5)),
    ]
    cirpattern1_2 = Solid(Shell([*[Face.make_surface_from_curves(cirpattern1_2_from[k], cirpattern1_2_to[k]) for k in range(10)], Face(Wire(cirpattern1_2_from)), Face(Wire(cirpattern1_2_to))]))
    add(cirpattern1_2)

    # Sketch15 → rebaix (cut)
    with BuildSketch(Plane.XZ.offset(10)):
        Rectangle(SKETCH15_W, SKETCH15_H)
    extrude(amount=-REBAIX_DEPTH, mode=Mode.SUBTRACT)

    # Cut-Extrude11: read off the stored shape, not the designer's step
    # Cut-Extrude11 outline → Cut-Extrude11 (cut)
    with BuildSketch(Plane(origin=(0, 7.5, 0), x_dir=(1, 0, 0), z_dir=(0, 1, 0)).offset(CUT_EXTRUDE11_START)):
        with BuildLine():
            ThreePointArc((19.158528942, 6.947258634), (18.550604255, 0), (19.158528942, -6.947258634))
            ThreePointArc((19.158528942, -6.947258634), (25.181319297, -17.378426685), (36.500000379, -21.497981165))
            Line((36.500000379, -21.497981165), (36.500002527, 21.497981165))
            ThreePointArc((36.500002527, 21.497981165), (25.181320119, 17.378427376), (19.158528942, 6.947258634))
        make_face()
    extrude(amount=CUT_EXTRUDE11_DEPTH, mode=Mode.SUBTRACT)

    # Sketch19 → Cut-Extrude12 (cut, through all)
    with BuildSketch(Plane(origin=(0, -8, 0), x_dir=(-1, 0, 0), z_dir=(0, -1, 0))):
        with Locations(Location((0, -32.5, 0), (0, 0, 90))):
            Circle(SKETCH19_R)
        with Locations(Location((0, 32.5, 0), (0, 0, 90))):
            Circle(SKETCH19_R)
    extrude(amount=-CUT_EXTRUDE12_DEPTH, mode=Mode.SUBTRACT)

    # Chamfer1
    chamfer1_edges = [part.edges().sort_by_distance(p)[0] for p in [
        (16.5, -8, 14.75),
        (-16.5, -8, -18.25),
        (-16.5, -8, 14.75),
        (16.5, -8, -18.25),
    ]]
    chamfer(chamfer1_edges, length=CHAMFER1_SIZE)


solid = part.part
